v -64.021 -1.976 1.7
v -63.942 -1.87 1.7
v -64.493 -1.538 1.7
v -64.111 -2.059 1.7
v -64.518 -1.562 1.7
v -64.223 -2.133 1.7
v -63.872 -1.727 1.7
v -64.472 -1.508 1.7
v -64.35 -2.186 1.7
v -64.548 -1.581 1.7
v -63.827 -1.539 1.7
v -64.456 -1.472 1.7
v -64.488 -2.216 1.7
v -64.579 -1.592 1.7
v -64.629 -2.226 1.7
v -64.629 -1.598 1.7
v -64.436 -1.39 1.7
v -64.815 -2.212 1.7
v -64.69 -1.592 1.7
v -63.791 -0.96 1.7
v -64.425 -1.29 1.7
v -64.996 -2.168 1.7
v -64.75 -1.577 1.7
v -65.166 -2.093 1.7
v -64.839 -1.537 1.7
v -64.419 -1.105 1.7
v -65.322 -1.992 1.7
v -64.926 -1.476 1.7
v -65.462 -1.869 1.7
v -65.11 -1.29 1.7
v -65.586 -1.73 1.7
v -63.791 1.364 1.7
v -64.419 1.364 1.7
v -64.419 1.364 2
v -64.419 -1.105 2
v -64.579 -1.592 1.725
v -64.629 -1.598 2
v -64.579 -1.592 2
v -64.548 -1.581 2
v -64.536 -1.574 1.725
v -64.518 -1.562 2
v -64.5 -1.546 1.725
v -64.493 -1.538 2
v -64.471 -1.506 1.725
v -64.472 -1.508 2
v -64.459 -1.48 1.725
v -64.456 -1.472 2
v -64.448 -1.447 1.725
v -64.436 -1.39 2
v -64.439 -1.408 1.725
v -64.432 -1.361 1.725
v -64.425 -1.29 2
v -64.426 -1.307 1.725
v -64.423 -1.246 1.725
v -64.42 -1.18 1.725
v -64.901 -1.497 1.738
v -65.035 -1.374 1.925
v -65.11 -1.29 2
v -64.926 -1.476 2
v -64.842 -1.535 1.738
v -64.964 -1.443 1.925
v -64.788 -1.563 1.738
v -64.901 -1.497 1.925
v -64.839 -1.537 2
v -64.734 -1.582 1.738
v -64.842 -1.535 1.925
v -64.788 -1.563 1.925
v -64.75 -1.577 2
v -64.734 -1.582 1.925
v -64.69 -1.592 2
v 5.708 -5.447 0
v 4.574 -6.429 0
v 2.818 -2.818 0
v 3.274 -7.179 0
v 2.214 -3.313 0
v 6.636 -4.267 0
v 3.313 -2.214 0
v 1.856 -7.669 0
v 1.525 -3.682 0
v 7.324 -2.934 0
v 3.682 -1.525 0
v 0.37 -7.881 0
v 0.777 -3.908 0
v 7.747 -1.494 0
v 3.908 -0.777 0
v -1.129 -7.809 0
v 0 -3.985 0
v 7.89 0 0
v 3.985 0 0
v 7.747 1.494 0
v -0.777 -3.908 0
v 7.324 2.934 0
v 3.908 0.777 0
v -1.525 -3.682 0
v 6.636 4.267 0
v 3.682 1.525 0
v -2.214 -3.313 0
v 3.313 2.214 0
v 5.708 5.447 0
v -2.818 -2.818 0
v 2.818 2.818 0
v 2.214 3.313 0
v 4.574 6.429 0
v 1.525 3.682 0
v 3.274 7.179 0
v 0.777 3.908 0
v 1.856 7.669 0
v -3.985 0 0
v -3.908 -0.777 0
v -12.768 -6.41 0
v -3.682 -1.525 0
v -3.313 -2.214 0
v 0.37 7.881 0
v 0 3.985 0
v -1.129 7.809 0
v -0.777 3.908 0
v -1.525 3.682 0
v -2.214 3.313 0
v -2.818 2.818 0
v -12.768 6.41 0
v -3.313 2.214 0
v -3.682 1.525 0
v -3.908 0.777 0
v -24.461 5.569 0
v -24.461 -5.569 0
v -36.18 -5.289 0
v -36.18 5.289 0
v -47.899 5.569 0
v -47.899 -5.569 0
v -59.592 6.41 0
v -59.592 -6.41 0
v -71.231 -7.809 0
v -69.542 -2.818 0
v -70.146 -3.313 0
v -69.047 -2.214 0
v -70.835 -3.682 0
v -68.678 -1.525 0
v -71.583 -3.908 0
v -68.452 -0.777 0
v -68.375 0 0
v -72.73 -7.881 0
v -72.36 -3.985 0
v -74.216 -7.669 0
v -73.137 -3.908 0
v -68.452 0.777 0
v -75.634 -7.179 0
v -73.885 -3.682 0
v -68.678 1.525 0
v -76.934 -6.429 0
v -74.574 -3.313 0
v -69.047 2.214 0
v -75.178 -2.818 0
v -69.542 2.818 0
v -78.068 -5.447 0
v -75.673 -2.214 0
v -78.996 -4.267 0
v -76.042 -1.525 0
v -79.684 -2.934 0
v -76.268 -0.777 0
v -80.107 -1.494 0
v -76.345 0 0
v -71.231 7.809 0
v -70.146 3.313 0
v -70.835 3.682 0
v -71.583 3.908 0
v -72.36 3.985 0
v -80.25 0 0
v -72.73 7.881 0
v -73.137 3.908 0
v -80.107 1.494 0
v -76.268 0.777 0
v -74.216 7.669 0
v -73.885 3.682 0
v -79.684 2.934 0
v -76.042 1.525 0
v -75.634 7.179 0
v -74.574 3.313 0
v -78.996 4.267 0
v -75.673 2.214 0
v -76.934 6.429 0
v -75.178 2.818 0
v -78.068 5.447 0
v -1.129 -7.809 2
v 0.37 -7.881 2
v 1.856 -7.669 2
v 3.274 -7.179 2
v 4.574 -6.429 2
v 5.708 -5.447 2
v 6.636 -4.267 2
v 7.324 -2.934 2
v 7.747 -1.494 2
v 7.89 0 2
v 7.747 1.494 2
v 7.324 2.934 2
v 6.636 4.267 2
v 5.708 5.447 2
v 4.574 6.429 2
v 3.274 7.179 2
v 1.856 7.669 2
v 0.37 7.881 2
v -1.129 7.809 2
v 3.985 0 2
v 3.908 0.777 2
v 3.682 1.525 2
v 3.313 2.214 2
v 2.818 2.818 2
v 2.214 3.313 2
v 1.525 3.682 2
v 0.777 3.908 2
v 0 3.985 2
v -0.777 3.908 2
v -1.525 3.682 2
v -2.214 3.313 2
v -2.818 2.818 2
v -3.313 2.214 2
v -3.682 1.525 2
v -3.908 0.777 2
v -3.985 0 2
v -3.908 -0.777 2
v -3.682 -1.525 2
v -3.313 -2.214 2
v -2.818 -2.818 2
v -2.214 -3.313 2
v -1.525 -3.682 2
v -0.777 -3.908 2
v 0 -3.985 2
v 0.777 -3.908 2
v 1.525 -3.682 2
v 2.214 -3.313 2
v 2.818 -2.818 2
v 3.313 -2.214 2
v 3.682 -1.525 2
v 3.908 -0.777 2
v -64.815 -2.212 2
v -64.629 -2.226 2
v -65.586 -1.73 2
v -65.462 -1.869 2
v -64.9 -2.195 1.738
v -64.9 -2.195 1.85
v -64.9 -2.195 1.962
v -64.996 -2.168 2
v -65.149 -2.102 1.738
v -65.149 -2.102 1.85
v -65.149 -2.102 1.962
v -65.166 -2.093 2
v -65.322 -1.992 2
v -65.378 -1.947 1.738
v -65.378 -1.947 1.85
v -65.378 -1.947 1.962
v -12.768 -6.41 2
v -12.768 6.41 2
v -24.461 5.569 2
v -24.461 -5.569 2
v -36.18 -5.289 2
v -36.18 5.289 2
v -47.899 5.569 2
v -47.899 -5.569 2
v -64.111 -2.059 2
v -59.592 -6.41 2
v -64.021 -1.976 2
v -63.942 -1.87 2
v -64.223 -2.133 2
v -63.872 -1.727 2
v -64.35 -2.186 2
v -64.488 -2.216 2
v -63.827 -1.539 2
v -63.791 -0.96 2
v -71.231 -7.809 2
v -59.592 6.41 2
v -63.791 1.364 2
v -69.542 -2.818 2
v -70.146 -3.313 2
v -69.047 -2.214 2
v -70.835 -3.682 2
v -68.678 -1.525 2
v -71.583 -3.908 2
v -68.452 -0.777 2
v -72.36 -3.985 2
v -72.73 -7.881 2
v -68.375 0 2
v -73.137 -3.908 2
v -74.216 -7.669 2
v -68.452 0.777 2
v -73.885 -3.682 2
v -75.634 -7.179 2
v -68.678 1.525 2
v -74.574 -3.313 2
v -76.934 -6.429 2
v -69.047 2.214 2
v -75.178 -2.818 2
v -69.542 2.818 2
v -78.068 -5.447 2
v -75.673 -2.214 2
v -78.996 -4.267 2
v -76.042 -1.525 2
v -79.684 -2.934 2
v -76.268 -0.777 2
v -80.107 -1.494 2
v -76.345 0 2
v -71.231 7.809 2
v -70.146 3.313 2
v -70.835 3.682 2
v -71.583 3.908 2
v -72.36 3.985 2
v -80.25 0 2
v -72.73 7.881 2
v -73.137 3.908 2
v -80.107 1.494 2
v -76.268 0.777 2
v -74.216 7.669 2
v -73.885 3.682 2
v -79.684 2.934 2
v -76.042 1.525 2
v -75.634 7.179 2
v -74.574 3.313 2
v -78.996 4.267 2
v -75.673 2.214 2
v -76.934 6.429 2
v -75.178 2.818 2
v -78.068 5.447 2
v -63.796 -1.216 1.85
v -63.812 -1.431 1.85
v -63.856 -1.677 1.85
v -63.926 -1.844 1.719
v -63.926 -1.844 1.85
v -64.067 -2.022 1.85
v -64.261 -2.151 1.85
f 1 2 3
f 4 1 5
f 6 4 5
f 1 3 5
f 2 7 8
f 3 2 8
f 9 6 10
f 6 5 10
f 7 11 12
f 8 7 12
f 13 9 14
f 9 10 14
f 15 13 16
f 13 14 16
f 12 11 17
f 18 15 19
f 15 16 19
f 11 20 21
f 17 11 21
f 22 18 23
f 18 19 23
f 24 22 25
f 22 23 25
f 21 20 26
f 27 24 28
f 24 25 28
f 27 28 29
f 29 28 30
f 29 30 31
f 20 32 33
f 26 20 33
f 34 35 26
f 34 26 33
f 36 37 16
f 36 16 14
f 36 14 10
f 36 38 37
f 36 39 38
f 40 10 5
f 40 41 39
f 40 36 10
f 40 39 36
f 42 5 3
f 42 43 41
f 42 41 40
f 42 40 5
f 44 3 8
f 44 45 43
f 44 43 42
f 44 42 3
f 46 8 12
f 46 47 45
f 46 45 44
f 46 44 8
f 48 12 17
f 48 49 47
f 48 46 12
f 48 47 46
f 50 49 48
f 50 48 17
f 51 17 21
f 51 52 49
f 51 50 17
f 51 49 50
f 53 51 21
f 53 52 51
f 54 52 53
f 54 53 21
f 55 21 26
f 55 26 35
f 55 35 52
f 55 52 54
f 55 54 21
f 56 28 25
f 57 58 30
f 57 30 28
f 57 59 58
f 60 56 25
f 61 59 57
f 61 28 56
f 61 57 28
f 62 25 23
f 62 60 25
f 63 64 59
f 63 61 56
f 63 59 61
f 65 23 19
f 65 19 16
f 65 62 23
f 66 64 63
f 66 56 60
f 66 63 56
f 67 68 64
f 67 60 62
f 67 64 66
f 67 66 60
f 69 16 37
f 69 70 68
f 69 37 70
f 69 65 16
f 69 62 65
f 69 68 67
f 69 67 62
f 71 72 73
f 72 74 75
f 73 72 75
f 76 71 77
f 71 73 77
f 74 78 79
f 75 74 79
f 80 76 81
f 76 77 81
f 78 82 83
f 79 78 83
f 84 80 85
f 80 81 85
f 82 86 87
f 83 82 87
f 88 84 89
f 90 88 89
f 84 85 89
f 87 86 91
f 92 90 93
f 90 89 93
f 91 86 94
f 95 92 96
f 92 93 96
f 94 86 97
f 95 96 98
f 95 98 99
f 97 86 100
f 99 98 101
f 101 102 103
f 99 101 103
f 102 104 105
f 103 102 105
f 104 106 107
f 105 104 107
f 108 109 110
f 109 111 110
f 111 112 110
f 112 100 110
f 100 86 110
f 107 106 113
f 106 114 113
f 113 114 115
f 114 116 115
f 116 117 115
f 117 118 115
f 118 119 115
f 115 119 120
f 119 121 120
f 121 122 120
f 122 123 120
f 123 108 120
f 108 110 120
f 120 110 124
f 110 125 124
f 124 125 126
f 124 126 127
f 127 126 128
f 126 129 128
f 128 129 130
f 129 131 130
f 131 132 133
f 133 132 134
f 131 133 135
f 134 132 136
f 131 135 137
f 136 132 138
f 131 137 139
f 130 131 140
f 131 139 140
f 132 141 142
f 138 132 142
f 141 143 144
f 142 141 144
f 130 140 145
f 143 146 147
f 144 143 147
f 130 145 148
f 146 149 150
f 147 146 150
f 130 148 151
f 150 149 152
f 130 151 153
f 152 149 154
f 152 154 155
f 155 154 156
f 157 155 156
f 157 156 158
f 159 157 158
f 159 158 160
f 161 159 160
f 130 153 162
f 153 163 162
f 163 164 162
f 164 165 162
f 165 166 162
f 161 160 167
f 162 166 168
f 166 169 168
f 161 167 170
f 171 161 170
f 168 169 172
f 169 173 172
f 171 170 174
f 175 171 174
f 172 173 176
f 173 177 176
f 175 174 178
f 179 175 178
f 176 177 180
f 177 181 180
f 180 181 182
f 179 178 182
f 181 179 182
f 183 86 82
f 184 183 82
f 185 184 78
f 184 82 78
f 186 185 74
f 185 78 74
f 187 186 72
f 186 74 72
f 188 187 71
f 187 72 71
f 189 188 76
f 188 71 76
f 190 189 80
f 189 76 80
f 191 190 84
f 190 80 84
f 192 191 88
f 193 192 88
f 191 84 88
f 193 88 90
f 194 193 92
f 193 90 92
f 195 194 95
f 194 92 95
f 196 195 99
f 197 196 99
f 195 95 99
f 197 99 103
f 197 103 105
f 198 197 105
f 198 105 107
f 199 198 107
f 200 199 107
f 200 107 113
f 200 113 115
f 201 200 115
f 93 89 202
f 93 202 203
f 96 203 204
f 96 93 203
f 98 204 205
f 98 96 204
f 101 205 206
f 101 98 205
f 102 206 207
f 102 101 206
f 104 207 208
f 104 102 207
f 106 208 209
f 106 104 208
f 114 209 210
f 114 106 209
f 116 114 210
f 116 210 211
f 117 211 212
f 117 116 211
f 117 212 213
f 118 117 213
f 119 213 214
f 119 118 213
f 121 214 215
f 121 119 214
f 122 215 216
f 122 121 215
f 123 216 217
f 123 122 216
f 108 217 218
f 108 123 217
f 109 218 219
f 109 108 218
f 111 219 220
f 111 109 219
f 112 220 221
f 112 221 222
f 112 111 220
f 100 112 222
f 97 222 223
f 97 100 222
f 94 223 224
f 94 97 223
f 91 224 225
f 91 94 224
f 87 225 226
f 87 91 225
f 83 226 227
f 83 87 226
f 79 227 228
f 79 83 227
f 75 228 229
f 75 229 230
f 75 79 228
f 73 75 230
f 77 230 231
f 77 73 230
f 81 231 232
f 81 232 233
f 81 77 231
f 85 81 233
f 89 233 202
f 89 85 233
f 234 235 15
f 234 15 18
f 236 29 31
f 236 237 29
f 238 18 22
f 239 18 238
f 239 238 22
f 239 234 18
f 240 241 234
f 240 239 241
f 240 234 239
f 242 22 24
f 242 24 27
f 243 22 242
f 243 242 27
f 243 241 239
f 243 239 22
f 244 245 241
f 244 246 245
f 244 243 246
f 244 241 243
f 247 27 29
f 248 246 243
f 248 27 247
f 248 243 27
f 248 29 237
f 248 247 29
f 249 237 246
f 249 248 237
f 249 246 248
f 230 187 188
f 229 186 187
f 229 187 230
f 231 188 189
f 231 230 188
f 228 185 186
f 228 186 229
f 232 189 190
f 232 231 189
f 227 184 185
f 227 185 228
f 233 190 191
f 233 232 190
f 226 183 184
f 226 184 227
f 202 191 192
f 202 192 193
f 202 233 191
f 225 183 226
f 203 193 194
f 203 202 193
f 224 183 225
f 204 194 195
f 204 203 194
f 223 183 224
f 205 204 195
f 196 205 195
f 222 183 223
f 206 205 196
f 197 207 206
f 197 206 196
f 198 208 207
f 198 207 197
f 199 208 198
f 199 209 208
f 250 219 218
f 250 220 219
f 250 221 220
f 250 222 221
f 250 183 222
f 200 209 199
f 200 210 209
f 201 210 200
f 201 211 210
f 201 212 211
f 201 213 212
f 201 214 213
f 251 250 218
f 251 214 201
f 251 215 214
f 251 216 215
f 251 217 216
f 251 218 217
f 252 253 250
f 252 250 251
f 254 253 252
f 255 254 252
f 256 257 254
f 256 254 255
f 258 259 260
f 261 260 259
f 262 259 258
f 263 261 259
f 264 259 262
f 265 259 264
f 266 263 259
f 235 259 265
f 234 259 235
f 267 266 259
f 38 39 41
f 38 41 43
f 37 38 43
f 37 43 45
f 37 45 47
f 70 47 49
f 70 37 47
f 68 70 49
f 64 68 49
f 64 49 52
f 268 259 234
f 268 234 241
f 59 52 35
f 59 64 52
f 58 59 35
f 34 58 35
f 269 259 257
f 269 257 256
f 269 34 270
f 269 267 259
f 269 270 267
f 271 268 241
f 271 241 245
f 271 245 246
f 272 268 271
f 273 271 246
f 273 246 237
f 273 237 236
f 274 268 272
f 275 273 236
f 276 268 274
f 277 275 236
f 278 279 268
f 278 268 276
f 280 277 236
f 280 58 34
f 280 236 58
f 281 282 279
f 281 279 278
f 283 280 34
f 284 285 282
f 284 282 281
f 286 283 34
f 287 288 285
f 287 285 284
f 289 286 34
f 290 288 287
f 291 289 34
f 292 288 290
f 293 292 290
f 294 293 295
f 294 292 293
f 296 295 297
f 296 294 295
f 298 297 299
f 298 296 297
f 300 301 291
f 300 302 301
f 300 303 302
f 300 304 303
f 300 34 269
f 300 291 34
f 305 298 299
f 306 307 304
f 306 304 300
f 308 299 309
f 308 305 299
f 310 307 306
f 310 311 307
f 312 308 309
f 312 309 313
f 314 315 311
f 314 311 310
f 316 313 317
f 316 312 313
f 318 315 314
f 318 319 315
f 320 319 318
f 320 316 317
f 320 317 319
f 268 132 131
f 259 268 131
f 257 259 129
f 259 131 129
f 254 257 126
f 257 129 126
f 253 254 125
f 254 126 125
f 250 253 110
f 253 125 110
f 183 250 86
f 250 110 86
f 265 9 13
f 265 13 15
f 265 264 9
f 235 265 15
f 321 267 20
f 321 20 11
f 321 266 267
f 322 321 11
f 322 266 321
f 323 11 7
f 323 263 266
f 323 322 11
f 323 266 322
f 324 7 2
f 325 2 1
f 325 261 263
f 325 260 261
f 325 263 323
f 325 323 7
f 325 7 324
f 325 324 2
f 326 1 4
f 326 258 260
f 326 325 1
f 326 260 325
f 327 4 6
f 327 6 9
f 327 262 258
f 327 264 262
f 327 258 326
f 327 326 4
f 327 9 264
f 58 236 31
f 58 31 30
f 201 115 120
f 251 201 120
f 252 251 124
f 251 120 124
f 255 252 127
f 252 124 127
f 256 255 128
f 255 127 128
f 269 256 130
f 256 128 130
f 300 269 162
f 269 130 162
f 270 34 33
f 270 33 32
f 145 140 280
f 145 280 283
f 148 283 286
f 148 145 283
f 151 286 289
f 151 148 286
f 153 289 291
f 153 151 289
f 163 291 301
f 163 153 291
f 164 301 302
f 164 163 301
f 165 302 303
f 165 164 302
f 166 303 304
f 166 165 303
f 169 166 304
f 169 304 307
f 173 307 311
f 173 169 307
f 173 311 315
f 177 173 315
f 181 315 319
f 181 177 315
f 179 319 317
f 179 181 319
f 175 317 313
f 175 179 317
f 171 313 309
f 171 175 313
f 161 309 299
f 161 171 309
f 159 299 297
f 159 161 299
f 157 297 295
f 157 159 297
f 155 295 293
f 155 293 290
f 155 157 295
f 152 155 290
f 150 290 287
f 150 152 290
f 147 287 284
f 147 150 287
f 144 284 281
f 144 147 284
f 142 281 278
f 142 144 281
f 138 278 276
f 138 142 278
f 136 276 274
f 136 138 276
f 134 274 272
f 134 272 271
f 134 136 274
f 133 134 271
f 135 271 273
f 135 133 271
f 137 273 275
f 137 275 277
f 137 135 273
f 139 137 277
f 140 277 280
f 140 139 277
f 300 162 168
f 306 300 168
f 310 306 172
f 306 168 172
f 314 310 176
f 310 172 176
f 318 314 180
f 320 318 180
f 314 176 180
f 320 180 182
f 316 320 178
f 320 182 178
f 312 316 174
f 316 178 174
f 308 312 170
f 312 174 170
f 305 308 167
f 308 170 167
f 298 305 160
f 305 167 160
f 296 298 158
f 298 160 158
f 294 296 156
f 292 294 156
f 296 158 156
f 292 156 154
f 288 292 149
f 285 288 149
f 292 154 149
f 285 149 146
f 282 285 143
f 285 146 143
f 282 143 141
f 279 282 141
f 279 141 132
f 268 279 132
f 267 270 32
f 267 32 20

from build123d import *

# Parameters (mm, degrees)
ESQUISSE1_R             = 3.985
BOSS_EXTRU_1_DEPTH      = 2
ENL_V_MAT_EXTRU_1_DEPTH = 0.3


with BuildPart() as part:
    # Esquisse1 → Boss.-Extru.1 (new body)
    with BuildSketch(Plane(origin=(0, 0, 0), x_dir=(0, 1, 0), z_dir=(0, 0, 1))):
        with BuildLine():
            ThreePointArc((-7.808836578, 1.128791965), (0, -7.89), (7.808836578, 1.128791965))
            ThreePointArc((7.808836578, 1.128791965), (5.288552874, 36.18), (7.808836578, 71.231208035))
            ThreePointArc((7.808836578, 71.231208035), (0, 80.25), (-7.808836578, 71.231208035))
            ThreePointArc((-7.808836578, 71.231208035), (-5.288552874, 36.18), (-7.808836578, 1.128791965))
        make_face()
        with Locations(Location((0, 0, 0), (0, 0, 270))):
            Circle(ESQUISSE1_R, mode=Mode.SUBTRACT)
        with Locations(Location((0, 72.36, 0), (0, 0, 270))):
            Circle(ESQUISSE1_R, mode=Mode.SUBTRACT)
    extrude(amount=BOSS_EXTRU_1_DEPTH)

    # Esquisse2 → Enlèv. mat.-Extru.1 (cut)
    with BuildSketch(Plane.XY.offset(2)):
        with BuildLine():
            Line((-64.419013619, 1.363972656), (-63.790808491, 1.363972656))
            Line((-63.790808491, 1.363972656), (-63.790808491, -0.959544972))
            add(Edge.make_bspline(
                [(-63.790808491, -0.959544972), (-63.791038809, -1.003953677), (-63.791482588, -1.089520485), (-63.795925603, -1.212705101), (-63.801933342, -1.32564701), (-63.810585066, -1.428165243), (-63.823435245, -1.520254841), (-63.837977746, -1.60214556), (-63.854022161, -1.674171081), (-63.881125115, -1.754778845), (-63.923201666, -1.844042774), (-63.986696382, -1.940460503), (-64.065767627, -2.02423108), (-64.156831583, -2.096995508), (-64.260655531, -2.154611171), (-64.374847611, -2.196255927), (-64.499042779, -2.221134792), (-64.58506355, -2.224195282), (-64.629350157, -2.225770934)],
                knots=[0, 0, 0, 0, 1.22248561, 2.355488409, 3.392943897, 4.335991845, 5.186735882, 5.951517034, 6.625683685, 7.215700098, 8.28923535, 9.333114649, 10.380102123, 11.447198135, 12.530158036, 13.633358744, 14.781567393, 16, 16, 16, 16], degree=3))
            add(Edge.make_bspline(
                [(-64.629350157, -2.225770934), (-64.675492772, -2.224342411), (-64.766504027, -2.221524808), (-64.899981406, -2.197526059), (-65.028269852, -2.159048845), (-65.150705669, -2.10341541), (-65.268966265, -2.033727017), (-65.380905318, -1.947285348), (-65.488859962, -1.846771339), (-65.552856134, -1.769639411), (-65.585680285, -1.730077825)],
                knots=[0, 0, 0, 0, 0.990984786, 1.954608977, 2.90473533, 3.862451285, 4.837525908, 5.848096122, 6.896271184, 8, 8, 8, 8], degree=3))
            Line((-65.585680285, -1.730077825), (-65.110319708, -1.290474459))
            add(Edge.make_bspline(
                [(-65.110319708, -1.290474459), (-65.085430365, -1.318617278), (-65.038855713, -1.371280057), (-64.968669084, -1.439953614), (-64.905356964, -1.495124891), (-64.845674591, -1.53492043), (-64.789353767, -1.562971842), (-64.73518271, -1.583178063), (-64.681472832, -1.594615932), (-64.645990448, -1.596597398), (-64.628649035, -1.597565805)],
                knots=[0, 0, 0, 0, 1.529509877, 2.862124173, 3.996688592, 4.944357383, 5.774364335, 6.554177287, 7.293378699, 8, 8, 8, 8], degree=3))
            add(Edge.make_bspline(
                [(-64.628649035, -1.597565805), (-64.611864478, -1.596690518), (-64.579593293, -1.595007627), (-64.535219176, -1.576300168), (-64.497808939, -1.54692867), (-64.473180247, -1.513162323), (-64.457485253, -1.478644025), (-64.447678724, -1.445276783), (-64.438372312, -1.405278504), (-64.430916222, -1.358669235), (-64.425282386, -1.30484102), (-64.422474327, -1.244447332), (-64.419059366, -1.177161813), (-64.41902941, -1.130157038), (-64.419013619, -1.105378305)],
                knots=[0, 0, 0, 0, 1.003927327, 1.930222208, 2.840933547, 3.835773585, 4.407906147, 5.114514582, 5.922289074, 6.876303333, 7.950072246, 9.174518422, 10.510537432, 12, 12, 12, 12], degree=3))
            Line((-64.419013619, -1.105378305), (-64.419013619, 1.363972656))
        make_face()
    extrude(amount=-ENL_V_MAT_EXTRU_1_DEPTH, mode=Mode.SUBTRACT)


solid = part.part
